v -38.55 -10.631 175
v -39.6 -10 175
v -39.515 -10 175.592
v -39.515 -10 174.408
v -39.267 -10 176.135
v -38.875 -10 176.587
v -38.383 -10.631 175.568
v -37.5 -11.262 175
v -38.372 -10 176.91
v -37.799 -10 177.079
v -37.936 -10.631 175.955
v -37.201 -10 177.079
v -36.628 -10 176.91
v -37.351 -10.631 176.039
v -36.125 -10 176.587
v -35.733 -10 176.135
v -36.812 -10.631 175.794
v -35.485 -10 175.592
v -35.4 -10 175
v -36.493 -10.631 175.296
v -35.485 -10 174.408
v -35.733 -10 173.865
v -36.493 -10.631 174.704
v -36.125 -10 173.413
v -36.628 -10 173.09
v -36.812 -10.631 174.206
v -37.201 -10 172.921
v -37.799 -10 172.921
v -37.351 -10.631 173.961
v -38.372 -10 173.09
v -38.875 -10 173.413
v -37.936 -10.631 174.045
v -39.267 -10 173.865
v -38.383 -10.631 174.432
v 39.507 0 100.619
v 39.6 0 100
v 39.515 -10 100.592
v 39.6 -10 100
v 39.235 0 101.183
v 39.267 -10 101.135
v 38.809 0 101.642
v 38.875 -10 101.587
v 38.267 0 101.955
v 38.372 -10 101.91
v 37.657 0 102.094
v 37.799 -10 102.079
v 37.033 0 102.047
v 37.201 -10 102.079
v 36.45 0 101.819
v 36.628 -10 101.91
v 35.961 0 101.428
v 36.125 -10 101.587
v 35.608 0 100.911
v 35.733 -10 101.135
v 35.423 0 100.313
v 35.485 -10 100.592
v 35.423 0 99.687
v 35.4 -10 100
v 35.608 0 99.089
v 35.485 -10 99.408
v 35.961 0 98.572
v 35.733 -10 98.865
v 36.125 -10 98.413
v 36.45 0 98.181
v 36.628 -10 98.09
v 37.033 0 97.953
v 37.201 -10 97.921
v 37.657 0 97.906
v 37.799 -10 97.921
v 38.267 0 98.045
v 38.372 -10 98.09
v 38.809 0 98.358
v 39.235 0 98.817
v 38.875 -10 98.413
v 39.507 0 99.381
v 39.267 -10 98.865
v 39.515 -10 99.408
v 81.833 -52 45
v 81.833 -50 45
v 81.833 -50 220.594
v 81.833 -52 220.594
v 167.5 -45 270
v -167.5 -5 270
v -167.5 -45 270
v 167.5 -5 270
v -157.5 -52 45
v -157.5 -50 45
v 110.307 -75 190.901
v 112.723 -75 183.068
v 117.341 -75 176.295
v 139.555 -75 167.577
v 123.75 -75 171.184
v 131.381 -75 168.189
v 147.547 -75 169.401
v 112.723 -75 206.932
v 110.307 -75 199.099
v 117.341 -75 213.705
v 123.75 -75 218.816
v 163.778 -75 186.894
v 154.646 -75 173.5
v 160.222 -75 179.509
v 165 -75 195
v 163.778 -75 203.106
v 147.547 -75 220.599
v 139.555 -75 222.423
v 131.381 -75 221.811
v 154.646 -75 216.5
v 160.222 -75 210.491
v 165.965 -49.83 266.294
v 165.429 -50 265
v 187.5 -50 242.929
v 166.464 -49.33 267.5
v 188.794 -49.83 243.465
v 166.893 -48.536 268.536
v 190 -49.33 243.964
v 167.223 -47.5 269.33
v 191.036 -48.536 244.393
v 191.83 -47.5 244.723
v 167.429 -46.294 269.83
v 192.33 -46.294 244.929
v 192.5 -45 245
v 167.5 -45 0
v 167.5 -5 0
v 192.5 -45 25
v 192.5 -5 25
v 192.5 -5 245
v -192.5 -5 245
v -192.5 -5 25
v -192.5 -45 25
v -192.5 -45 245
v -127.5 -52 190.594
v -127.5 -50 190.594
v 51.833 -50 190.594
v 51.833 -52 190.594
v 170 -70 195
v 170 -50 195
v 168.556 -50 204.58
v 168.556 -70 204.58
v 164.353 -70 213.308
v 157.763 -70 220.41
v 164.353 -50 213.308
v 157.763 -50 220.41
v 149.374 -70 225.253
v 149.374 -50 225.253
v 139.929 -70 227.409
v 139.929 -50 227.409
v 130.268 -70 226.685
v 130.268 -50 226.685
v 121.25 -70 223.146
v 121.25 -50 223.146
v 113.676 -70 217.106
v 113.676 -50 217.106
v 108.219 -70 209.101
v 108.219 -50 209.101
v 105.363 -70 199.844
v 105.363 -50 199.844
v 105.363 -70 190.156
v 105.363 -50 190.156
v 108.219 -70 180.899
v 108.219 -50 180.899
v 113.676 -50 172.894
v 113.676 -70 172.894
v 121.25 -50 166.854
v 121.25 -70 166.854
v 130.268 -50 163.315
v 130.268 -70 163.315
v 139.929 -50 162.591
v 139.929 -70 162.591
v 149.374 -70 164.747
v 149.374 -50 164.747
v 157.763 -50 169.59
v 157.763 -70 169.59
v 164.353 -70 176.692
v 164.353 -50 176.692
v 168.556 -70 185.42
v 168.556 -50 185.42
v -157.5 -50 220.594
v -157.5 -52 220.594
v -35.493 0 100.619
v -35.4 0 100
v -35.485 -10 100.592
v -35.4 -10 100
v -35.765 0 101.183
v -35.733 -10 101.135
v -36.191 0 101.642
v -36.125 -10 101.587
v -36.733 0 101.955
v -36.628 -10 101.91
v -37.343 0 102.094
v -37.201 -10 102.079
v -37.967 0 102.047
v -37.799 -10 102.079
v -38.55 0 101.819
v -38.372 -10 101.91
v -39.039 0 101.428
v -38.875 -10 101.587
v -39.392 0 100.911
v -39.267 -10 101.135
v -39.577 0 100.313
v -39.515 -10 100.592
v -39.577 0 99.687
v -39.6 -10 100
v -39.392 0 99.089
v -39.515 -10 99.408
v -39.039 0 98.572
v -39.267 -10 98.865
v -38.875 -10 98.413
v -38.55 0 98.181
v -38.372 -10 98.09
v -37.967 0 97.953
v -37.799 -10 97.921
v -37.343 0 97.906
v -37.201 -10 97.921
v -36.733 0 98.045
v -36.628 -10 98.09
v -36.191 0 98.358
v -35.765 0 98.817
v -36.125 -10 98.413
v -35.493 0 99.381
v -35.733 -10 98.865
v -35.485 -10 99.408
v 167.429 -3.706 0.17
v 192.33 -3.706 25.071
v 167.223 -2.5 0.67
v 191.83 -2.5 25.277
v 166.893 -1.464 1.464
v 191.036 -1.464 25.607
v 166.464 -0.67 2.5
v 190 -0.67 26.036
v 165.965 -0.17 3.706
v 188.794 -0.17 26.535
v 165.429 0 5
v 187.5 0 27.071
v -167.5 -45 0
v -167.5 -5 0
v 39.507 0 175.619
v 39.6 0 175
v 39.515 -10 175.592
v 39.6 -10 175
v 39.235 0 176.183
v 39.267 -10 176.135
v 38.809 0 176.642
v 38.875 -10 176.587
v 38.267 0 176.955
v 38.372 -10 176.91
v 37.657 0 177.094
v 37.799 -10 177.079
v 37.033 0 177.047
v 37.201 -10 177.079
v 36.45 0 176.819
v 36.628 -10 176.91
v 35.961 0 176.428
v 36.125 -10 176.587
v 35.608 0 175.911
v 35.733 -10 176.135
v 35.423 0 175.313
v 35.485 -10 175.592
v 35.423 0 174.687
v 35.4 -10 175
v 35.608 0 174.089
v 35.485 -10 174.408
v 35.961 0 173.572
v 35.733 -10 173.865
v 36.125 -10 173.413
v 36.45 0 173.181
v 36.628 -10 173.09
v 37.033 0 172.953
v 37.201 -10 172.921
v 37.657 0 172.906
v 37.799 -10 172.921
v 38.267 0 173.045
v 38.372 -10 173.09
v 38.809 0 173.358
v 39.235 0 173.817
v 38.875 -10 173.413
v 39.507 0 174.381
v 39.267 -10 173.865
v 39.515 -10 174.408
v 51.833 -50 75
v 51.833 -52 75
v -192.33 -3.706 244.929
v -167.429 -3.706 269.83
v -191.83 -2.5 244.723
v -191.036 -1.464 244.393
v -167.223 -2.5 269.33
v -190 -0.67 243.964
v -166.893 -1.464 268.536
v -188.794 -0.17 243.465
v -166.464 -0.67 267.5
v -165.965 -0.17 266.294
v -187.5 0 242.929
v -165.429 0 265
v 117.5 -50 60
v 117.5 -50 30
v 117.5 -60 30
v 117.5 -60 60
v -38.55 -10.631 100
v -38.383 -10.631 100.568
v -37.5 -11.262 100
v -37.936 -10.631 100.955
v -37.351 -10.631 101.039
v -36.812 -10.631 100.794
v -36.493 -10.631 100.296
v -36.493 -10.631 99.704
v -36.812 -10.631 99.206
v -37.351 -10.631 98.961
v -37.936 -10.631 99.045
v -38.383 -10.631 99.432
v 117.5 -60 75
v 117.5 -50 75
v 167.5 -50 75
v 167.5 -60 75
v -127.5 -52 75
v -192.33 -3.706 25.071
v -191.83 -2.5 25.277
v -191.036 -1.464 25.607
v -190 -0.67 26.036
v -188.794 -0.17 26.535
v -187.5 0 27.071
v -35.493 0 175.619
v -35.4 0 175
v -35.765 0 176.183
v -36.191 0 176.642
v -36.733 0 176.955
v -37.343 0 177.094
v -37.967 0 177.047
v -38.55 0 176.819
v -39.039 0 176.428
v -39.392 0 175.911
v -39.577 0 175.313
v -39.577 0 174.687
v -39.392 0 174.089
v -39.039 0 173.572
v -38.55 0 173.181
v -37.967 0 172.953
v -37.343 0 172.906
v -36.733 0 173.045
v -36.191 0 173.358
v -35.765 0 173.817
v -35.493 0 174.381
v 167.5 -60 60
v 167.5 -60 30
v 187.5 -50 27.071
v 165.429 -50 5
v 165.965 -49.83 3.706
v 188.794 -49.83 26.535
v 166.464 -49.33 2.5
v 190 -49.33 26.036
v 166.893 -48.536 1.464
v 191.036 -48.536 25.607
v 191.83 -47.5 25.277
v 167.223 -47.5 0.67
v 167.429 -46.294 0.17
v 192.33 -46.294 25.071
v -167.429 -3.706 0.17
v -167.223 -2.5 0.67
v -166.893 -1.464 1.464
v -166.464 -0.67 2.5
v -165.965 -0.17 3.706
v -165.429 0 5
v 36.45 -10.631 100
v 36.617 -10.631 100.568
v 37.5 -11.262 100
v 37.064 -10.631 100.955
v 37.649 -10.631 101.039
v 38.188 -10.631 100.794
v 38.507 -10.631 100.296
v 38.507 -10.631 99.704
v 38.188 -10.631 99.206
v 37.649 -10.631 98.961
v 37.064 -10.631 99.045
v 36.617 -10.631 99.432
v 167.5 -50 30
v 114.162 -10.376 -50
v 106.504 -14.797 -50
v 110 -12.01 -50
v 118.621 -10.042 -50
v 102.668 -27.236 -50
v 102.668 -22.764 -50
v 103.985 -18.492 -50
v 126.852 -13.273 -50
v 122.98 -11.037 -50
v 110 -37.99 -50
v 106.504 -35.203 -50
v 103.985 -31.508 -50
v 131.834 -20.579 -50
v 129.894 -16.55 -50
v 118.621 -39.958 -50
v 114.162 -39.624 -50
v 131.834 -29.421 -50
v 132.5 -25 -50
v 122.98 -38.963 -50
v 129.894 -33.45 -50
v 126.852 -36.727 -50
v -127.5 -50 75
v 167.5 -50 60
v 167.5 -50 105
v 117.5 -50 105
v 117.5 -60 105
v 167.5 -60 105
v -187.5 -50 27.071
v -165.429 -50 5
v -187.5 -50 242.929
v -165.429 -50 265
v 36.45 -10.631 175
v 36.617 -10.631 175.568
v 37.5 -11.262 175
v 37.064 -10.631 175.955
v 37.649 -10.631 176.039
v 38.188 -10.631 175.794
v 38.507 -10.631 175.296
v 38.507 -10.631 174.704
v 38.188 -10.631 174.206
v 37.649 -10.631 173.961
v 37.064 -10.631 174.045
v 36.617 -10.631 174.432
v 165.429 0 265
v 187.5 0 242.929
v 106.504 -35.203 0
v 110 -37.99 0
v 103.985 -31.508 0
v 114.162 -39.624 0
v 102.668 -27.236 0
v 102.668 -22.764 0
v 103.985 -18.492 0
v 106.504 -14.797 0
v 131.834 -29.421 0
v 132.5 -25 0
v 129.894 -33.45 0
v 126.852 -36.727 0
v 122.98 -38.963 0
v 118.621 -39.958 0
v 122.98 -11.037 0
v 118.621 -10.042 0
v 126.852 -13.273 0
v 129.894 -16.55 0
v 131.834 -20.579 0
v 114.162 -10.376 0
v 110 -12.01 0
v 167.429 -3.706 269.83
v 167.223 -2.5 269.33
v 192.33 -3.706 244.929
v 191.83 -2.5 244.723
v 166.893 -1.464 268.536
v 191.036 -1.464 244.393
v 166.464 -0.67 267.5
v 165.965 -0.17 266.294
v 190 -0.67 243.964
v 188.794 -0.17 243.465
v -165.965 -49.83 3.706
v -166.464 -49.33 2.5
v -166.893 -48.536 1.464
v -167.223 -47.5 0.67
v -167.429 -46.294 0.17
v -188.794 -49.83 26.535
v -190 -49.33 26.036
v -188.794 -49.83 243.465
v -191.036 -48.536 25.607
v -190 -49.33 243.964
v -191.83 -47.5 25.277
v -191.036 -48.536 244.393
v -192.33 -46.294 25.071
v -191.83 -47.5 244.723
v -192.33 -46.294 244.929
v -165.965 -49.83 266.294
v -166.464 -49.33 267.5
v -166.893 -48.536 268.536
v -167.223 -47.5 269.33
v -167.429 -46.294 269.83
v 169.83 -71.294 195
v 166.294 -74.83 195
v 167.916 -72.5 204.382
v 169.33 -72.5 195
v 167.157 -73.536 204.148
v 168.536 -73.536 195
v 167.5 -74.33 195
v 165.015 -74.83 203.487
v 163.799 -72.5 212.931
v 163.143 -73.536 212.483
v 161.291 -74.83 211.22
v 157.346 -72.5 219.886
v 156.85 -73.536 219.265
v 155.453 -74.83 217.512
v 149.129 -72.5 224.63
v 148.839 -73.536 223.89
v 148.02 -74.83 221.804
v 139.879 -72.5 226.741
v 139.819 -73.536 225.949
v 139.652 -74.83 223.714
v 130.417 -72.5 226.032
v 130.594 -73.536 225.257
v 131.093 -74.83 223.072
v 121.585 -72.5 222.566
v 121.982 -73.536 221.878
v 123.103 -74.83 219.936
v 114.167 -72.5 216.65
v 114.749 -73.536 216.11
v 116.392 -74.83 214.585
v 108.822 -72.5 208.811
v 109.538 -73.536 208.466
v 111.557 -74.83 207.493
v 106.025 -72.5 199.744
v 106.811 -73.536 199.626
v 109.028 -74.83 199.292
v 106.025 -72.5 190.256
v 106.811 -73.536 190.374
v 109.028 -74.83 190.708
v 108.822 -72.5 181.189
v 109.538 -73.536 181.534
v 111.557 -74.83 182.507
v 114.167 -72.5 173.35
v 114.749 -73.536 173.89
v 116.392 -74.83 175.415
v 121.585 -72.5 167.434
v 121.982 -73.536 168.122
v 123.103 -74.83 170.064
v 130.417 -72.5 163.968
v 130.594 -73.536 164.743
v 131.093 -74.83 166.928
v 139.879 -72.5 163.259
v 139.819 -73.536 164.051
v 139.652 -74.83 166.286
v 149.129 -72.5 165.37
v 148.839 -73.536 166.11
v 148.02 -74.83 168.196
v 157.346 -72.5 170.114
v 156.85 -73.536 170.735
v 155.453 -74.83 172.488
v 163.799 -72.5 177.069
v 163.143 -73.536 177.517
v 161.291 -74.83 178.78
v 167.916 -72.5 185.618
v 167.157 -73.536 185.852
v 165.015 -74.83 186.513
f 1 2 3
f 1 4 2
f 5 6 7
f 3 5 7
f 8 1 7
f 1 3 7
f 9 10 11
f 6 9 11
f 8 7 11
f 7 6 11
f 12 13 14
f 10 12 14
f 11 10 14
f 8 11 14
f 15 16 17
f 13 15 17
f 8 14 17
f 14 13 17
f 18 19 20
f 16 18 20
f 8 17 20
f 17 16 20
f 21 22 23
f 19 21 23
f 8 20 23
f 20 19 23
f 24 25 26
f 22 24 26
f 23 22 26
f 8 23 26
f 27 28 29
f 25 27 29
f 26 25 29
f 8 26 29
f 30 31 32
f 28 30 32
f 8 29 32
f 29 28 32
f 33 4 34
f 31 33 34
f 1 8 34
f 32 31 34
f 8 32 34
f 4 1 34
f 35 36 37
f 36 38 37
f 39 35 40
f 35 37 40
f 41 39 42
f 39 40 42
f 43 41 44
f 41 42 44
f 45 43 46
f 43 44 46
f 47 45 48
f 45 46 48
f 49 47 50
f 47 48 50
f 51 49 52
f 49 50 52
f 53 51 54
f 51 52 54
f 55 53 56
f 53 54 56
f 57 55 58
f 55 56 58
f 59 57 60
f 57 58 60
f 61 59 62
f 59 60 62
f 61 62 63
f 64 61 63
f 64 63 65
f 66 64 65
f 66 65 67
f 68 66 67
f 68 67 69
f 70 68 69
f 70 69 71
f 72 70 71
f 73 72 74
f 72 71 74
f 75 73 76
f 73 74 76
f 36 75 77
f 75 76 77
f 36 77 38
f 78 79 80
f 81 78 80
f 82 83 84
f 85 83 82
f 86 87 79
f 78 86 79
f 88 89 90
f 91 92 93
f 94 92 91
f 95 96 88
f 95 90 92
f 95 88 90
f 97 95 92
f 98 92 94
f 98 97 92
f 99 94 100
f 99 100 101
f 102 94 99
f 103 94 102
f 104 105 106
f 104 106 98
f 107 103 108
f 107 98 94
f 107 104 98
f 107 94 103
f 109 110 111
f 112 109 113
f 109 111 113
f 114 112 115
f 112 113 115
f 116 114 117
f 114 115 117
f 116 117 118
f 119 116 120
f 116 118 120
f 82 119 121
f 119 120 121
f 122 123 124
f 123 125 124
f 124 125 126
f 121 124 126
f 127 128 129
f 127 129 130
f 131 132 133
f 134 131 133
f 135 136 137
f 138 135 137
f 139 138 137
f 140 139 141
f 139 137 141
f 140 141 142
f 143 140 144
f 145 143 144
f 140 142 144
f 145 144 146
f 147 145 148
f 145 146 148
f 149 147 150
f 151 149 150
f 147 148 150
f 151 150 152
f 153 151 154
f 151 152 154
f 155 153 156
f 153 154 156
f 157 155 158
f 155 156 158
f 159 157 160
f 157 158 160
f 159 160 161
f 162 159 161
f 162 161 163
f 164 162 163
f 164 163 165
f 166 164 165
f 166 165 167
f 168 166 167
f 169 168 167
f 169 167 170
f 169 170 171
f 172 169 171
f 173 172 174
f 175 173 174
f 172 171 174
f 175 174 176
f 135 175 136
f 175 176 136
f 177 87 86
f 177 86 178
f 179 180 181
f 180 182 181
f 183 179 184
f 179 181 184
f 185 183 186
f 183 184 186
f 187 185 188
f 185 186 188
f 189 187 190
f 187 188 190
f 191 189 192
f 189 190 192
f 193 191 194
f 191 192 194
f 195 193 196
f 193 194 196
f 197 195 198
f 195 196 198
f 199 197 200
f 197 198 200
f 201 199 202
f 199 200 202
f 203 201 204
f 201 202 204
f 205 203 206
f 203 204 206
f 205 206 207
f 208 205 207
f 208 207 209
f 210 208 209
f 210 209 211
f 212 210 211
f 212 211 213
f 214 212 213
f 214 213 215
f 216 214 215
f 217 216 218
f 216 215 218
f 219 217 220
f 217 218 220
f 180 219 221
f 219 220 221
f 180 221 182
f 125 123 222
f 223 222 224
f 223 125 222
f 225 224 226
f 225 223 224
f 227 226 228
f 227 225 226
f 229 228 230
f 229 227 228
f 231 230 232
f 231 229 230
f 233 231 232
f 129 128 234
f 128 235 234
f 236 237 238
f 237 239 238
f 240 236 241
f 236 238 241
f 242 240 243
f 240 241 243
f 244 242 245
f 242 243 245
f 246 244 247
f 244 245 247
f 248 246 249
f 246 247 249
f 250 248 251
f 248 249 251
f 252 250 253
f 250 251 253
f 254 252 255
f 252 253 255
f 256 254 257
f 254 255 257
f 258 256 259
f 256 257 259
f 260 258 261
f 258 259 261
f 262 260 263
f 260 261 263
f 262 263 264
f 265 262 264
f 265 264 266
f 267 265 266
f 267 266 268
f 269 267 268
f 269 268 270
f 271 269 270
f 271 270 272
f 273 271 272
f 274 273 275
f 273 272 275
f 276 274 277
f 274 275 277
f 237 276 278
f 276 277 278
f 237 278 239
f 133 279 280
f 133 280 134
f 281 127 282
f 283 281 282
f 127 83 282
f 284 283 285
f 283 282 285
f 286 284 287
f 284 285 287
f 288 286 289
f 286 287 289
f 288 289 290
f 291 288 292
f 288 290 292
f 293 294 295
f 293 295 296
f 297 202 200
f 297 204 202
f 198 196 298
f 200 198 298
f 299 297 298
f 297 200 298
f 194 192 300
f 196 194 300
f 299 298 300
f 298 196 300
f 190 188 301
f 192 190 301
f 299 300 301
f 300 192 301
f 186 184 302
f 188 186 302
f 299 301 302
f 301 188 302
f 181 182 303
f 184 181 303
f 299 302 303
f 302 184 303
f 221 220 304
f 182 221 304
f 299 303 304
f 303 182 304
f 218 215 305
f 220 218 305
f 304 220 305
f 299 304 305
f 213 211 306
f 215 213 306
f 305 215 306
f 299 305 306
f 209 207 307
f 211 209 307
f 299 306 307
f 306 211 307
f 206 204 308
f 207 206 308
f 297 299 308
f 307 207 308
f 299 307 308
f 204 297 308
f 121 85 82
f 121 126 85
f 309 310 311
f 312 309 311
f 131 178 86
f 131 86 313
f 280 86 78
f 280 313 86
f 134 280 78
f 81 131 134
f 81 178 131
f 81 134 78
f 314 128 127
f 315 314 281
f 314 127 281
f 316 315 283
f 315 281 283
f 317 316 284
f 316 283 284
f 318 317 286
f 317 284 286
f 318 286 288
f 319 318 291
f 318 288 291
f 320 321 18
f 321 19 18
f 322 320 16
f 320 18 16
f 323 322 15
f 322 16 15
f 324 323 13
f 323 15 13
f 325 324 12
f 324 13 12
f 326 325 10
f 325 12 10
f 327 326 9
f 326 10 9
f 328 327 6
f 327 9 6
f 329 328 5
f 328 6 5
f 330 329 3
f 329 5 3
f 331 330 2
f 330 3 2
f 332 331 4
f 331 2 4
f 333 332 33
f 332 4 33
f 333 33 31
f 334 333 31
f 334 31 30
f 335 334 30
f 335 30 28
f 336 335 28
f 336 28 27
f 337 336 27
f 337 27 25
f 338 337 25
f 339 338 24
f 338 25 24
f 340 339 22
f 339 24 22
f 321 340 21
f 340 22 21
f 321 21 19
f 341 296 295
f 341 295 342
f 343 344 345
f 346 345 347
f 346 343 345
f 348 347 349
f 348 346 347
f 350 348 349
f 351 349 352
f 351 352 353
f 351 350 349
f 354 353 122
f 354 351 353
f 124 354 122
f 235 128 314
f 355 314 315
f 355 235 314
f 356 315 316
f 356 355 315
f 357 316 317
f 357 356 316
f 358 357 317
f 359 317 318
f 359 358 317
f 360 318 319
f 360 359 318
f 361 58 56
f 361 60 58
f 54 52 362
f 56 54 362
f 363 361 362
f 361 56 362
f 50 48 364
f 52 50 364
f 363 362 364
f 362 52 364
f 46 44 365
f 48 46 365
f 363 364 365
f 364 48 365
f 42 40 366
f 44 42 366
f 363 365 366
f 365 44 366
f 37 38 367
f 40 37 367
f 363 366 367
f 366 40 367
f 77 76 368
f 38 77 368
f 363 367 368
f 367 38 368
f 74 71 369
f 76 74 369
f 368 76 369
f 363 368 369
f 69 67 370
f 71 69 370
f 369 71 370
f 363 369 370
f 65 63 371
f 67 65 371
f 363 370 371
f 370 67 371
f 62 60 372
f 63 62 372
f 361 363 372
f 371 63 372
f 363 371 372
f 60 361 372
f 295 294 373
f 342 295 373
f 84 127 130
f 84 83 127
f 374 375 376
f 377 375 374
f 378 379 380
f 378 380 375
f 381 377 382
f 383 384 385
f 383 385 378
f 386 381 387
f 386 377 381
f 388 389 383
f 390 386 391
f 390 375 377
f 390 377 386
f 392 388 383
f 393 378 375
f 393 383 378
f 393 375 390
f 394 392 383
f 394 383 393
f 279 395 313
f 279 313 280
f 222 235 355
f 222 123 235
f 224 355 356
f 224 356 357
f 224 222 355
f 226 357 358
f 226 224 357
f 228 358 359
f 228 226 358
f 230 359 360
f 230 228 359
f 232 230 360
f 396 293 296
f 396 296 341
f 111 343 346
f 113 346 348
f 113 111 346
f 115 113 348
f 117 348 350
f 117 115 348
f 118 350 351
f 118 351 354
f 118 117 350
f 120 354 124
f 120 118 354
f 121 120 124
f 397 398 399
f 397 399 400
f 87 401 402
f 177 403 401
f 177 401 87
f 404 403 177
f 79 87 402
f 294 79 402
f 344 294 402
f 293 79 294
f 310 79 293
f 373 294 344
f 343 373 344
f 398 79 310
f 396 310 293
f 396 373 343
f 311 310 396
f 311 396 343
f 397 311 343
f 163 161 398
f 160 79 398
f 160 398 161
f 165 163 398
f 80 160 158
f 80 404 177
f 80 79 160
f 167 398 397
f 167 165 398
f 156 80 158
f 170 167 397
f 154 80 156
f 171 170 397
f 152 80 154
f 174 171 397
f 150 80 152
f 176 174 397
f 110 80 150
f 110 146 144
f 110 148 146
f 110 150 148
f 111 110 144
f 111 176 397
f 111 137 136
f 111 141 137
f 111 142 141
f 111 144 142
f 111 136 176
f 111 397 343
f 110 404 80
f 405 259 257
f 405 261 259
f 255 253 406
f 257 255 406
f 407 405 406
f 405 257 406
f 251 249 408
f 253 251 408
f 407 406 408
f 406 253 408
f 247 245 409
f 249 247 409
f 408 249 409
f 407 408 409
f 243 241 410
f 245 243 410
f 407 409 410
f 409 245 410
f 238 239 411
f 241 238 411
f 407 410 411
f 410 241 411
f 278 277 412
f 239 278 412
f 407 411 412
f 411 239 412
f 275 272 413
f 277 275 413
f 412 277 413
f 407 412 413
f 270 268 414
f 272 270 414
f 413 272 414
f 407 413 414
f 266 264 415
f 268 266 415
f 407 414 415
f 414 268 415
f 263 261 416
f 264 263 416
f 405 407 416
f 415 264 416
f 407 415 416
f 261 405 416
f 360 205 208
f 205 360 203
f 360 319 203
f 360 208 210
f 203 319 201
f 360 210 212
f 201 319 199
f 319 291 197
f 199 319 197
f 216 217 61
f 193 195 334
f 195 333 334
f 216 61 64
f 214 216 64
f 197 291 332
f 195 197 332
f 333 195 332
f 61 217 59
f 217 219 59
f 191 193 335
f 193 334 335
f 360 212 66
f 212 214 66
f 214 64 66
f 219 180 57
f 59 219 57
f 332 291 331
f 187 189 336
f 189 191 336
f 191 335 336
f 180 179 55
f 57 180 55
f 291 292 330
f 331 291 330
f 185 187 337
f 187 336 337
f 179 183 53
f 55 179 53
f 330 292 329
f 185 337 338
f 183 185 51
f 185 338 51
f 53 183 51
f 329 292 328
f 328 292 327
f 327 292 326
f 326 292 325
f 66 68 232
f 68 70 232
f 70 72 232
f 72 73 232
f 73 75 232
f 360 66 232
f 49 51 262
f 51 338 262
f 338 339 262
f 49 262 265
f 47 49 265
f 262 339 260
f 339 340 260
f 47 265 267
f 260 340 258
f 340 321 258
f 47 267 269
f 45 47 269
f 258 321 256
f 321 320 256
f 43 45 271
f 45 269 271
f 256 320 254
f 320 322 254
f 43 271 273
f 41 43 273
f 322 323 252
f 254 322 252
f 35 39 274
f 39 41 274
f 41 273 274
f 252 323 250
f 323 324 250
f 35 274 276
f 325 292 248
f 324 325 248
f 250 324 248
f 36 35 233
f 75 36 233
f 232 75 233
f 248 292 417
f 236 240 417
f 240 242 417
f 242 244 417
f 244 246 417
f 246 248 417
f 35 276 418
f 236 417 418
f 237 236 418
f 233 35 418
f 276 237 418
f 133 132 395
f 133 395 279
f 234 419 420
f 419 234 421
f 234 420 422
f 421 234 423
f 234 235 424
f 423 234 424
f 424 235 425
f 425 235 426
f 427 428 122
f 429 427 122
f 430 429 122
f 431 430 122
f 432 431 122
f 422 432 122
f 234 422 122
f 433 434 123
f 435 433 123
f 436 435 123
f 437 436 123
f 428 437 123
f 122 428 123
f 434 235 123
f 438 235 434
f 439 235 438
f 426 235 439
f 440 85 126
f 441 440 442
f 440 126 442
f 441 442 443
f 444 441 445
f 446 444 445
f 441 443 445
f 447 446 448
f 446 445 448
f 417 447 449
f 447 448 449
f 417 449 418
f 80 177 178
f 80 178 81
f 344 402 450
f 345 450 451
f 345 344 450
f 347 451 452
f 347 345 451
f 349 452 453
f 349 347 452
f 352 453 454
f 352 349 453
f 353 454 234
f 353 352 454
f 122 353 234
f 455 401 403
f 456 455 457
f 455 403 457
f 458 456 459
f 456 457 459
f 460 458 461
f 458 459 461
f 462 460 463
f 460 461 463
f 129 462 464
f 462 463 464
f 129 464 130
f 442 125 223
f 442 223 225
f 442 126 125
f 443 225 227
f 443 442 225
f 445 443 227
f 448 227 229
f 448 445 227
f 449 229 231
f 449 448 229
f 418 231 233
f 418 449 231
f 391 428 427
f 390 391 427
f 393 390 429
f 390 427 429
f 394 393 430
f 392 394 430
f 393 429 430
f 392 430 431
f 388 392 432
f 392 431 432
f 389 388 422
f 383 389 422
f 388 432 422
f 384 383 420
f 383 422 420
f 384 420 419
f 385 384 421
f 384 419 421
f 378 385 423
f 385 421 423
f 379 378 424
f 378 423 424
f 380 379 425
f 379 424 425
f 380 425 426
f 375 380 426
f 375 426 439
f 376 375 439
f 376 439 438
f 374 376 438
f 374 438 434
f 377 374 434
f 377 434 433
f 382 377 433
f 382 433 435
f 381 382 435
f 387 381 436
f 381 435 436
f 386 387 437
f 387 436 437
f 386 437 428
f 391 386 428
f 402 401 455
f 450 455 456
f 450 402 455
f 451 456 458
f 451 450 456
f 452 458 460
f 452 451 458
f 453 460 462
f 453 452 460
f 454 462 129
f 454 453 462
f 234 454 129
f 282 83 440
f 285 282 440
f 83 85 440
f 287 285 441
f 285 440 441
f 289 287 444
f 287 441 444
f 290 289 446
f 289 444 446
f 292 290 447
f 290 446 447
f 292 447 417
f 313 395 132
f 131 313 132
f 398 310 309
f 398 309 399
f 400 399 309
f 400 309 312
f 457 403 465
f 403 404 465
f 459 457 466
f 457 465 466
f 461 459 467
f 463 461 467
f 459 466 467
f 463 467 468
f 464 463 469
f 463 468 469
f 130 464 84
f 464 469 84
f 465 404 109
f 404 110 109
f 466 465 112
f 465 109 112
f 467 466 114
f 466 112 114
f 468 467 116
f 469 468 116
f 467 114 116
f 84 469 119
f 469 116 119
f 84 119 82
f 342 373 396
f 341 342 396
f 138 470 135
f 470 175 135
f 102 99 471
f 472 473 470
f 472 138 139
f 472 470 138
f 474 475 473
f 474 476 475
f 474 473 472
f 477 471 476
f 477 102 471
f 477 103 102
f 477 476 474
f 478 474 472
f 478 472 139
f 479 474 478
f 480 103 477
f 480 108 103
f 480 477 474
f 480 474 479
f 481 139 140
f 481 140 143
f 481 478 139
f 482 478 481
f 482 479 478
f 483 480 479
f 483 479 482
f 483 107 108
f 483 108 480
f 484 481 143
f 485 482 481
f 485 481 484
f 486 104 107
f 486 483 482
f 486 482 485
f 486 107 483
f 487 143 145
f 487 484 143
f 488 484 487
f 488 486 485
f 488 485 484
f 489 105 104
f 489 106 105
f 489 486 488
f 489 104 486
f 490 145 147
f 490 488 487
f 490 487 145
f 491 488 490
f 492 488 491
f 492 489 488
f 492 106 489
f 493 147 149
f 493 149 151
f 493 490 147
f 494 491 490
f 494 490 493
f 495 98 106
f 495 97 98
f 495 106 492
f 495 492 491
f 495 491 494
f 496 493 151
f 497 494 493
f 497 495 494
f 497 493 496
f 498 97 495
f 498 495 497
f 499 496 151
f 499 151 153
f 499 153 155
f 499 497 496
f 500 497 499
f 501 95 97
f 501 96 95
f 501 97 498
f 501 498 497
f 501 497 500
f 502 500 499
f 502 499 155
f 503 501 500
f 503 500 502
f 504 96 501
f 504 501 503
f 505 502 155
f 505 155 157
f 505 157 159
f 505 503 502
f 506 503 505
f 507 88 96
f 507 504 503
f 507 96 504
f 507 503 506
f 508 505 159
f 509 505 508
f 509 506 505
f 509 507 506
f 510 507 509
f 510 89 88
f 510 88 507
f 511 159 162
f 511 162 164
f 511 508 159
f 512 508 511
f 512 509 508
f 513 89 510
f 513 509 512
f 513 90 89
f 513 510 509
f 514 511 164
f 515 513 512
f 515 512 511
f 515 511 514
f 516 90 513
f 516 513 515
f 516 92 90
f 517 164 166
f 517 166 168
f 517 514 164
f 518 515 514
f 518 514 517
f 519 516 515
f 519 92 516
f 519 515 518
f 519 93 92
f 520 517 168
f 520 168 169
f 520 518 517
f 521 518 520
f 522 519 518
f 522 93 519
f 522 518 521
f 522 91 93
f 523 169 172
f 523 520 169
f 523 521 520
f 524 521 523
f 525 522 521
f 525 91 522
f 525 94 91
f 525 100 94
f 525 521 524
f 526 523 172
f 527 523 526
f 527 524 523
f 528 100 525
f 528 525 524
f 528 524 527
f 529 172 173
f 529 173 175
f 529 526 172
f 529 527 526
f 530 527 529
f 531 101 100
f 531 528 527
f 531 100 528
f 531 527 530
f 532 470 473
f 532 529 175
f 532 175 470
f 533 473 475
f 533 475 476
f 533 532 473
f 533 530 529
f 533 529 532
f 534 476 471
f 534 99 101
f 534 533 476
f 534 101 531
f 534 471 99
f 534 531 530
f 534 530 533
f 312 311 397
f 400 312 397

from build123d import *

# Parameters (mm, degrees)
F0_W      = 385
F0_H      = 270
F1_DEPTH  = 50
F2_W      = 239.333302365
F2_H      = 175.5943608609
F2_W_2    = 179.333302365
F2_H_2    = 115.5943608609
F3_DEPTH  = 2
F4_R      = 32.5
F5_DEPTH  = 25
F6_W      = 50
F6_H      = 30
F7_DEPTH  = 10
F8_SIZE   = 25
F9_R      = 5
F10_R     = 15
F11_DEPTH = 50
F13_D     = 4.2
F13_DEPTH = 10
F13_TIP   = 1.2618073
F14_R     = 5


with BuildPart() as f1:
    # F0 (on Front) → F1 (new body)
    with BuildSketch(Plane.XZ):
        with Locations((0, 135)):
            Rectangle(F0_W, F0_H)
    extrude(amount=F1_DEPTH)

    # F2 (on face) → F3 (join)
    with BuildSketch(Plane.XZ.offset(50)):
        with Locations((-37.8333488175, 132.7971804305)):
            Rectangle(F2_W, F2_H)
        with Locations((-37.8333488175, 132.7971804305)):
            Rectangle(F2_W_2, F2_H_2, mode=Mode.SUBTRACT)
    extrude(amount=F3_DEPTH)

    # F4 (on face) → F5 (join)
    with BuildSketch(Plane.XZ.offset(50)):
        with Locations((137.5, 195)):
            Circle(F4_R)
    extrude(amount=F5_DEPTH)

    # F6 (on face) → F7 (join)
    with BuildSketch(Plane.XZ.offset(50)):
        with Locations((142.5, 90)):
            Rectangle(F6_W, F6_H)
        with Locations((142.5, 45)):
            Rectangle(F6_W, F6_H)
    extrude(amount=F7_DEPTH)

    # F8
    f8_edges = [f1.edges().sort_by_distance(p)[0] for p in [
        (192.5, -25, 270),
        (-192.5, -25, 270),
        (-192.5, -25, 0),
        (192.5, -25, 0),
    ]]
    chamfer(f8_edges, length=F8_SIZE)

    # F9
    f9_edges = [f1.edges().sort_by_distance(p)[0] for p in [
        (105, -75, 195),
    ]]
    fillet(f9_edges, radius=F9_R)

    # F10 (on face) → F11 (join)
    with BuildSketch(Plane(origin=(0, 0, 0), x_dir=(1, 0, 0), z_dir=(0, 0, -1))):
        with Locations((117.5, 25)):
            Circle(F10_R)
    extrude(amount=F11_DEPTH)

    # F13
    with Locations(Plane(origin=(0, 0, 0), x_dir=(-1, 0, 0), z_dir=(0, 1, 0))):
        with Locations((-37.5, 175), (37.5, 175), (37.5, 100), (-37.5, 100)):
            Hole(F13_D / 2, depth=F13_DEPTH)
            with Locations((0, 0, -(F13_DEPTH + F13_TIP / 2))):  # 118° drill point
                Cone(0, F13_D / 2, F13_TIP, mode=Mode.SUBTRACT)

    # F14
    f14_edges = [f1.edges().sort_by_distance(p)[0] for p in [
        (0, 0, 270),
        (180, 0, 257.5),
        (192.5, 0, 135),
        (180, 0, 12.5),
        (0, 0, 0),
        (-180, 0, 257.5),
        (-192.5, 0, 135),
        (-180, 0, 12.5),
        (180, -50, 257.5),
        (192.5, -50, 135),
        (180, -50, 12.5),
        (0, -50, 0),
        (-180, -50, 12.5),
        (-192.5, -50, 135),
        (-180, -50, 257.5),
        (0, -50, 270),
    ]]
    fillet(f14_edges, radius=F14_R)


solid = f1.part
